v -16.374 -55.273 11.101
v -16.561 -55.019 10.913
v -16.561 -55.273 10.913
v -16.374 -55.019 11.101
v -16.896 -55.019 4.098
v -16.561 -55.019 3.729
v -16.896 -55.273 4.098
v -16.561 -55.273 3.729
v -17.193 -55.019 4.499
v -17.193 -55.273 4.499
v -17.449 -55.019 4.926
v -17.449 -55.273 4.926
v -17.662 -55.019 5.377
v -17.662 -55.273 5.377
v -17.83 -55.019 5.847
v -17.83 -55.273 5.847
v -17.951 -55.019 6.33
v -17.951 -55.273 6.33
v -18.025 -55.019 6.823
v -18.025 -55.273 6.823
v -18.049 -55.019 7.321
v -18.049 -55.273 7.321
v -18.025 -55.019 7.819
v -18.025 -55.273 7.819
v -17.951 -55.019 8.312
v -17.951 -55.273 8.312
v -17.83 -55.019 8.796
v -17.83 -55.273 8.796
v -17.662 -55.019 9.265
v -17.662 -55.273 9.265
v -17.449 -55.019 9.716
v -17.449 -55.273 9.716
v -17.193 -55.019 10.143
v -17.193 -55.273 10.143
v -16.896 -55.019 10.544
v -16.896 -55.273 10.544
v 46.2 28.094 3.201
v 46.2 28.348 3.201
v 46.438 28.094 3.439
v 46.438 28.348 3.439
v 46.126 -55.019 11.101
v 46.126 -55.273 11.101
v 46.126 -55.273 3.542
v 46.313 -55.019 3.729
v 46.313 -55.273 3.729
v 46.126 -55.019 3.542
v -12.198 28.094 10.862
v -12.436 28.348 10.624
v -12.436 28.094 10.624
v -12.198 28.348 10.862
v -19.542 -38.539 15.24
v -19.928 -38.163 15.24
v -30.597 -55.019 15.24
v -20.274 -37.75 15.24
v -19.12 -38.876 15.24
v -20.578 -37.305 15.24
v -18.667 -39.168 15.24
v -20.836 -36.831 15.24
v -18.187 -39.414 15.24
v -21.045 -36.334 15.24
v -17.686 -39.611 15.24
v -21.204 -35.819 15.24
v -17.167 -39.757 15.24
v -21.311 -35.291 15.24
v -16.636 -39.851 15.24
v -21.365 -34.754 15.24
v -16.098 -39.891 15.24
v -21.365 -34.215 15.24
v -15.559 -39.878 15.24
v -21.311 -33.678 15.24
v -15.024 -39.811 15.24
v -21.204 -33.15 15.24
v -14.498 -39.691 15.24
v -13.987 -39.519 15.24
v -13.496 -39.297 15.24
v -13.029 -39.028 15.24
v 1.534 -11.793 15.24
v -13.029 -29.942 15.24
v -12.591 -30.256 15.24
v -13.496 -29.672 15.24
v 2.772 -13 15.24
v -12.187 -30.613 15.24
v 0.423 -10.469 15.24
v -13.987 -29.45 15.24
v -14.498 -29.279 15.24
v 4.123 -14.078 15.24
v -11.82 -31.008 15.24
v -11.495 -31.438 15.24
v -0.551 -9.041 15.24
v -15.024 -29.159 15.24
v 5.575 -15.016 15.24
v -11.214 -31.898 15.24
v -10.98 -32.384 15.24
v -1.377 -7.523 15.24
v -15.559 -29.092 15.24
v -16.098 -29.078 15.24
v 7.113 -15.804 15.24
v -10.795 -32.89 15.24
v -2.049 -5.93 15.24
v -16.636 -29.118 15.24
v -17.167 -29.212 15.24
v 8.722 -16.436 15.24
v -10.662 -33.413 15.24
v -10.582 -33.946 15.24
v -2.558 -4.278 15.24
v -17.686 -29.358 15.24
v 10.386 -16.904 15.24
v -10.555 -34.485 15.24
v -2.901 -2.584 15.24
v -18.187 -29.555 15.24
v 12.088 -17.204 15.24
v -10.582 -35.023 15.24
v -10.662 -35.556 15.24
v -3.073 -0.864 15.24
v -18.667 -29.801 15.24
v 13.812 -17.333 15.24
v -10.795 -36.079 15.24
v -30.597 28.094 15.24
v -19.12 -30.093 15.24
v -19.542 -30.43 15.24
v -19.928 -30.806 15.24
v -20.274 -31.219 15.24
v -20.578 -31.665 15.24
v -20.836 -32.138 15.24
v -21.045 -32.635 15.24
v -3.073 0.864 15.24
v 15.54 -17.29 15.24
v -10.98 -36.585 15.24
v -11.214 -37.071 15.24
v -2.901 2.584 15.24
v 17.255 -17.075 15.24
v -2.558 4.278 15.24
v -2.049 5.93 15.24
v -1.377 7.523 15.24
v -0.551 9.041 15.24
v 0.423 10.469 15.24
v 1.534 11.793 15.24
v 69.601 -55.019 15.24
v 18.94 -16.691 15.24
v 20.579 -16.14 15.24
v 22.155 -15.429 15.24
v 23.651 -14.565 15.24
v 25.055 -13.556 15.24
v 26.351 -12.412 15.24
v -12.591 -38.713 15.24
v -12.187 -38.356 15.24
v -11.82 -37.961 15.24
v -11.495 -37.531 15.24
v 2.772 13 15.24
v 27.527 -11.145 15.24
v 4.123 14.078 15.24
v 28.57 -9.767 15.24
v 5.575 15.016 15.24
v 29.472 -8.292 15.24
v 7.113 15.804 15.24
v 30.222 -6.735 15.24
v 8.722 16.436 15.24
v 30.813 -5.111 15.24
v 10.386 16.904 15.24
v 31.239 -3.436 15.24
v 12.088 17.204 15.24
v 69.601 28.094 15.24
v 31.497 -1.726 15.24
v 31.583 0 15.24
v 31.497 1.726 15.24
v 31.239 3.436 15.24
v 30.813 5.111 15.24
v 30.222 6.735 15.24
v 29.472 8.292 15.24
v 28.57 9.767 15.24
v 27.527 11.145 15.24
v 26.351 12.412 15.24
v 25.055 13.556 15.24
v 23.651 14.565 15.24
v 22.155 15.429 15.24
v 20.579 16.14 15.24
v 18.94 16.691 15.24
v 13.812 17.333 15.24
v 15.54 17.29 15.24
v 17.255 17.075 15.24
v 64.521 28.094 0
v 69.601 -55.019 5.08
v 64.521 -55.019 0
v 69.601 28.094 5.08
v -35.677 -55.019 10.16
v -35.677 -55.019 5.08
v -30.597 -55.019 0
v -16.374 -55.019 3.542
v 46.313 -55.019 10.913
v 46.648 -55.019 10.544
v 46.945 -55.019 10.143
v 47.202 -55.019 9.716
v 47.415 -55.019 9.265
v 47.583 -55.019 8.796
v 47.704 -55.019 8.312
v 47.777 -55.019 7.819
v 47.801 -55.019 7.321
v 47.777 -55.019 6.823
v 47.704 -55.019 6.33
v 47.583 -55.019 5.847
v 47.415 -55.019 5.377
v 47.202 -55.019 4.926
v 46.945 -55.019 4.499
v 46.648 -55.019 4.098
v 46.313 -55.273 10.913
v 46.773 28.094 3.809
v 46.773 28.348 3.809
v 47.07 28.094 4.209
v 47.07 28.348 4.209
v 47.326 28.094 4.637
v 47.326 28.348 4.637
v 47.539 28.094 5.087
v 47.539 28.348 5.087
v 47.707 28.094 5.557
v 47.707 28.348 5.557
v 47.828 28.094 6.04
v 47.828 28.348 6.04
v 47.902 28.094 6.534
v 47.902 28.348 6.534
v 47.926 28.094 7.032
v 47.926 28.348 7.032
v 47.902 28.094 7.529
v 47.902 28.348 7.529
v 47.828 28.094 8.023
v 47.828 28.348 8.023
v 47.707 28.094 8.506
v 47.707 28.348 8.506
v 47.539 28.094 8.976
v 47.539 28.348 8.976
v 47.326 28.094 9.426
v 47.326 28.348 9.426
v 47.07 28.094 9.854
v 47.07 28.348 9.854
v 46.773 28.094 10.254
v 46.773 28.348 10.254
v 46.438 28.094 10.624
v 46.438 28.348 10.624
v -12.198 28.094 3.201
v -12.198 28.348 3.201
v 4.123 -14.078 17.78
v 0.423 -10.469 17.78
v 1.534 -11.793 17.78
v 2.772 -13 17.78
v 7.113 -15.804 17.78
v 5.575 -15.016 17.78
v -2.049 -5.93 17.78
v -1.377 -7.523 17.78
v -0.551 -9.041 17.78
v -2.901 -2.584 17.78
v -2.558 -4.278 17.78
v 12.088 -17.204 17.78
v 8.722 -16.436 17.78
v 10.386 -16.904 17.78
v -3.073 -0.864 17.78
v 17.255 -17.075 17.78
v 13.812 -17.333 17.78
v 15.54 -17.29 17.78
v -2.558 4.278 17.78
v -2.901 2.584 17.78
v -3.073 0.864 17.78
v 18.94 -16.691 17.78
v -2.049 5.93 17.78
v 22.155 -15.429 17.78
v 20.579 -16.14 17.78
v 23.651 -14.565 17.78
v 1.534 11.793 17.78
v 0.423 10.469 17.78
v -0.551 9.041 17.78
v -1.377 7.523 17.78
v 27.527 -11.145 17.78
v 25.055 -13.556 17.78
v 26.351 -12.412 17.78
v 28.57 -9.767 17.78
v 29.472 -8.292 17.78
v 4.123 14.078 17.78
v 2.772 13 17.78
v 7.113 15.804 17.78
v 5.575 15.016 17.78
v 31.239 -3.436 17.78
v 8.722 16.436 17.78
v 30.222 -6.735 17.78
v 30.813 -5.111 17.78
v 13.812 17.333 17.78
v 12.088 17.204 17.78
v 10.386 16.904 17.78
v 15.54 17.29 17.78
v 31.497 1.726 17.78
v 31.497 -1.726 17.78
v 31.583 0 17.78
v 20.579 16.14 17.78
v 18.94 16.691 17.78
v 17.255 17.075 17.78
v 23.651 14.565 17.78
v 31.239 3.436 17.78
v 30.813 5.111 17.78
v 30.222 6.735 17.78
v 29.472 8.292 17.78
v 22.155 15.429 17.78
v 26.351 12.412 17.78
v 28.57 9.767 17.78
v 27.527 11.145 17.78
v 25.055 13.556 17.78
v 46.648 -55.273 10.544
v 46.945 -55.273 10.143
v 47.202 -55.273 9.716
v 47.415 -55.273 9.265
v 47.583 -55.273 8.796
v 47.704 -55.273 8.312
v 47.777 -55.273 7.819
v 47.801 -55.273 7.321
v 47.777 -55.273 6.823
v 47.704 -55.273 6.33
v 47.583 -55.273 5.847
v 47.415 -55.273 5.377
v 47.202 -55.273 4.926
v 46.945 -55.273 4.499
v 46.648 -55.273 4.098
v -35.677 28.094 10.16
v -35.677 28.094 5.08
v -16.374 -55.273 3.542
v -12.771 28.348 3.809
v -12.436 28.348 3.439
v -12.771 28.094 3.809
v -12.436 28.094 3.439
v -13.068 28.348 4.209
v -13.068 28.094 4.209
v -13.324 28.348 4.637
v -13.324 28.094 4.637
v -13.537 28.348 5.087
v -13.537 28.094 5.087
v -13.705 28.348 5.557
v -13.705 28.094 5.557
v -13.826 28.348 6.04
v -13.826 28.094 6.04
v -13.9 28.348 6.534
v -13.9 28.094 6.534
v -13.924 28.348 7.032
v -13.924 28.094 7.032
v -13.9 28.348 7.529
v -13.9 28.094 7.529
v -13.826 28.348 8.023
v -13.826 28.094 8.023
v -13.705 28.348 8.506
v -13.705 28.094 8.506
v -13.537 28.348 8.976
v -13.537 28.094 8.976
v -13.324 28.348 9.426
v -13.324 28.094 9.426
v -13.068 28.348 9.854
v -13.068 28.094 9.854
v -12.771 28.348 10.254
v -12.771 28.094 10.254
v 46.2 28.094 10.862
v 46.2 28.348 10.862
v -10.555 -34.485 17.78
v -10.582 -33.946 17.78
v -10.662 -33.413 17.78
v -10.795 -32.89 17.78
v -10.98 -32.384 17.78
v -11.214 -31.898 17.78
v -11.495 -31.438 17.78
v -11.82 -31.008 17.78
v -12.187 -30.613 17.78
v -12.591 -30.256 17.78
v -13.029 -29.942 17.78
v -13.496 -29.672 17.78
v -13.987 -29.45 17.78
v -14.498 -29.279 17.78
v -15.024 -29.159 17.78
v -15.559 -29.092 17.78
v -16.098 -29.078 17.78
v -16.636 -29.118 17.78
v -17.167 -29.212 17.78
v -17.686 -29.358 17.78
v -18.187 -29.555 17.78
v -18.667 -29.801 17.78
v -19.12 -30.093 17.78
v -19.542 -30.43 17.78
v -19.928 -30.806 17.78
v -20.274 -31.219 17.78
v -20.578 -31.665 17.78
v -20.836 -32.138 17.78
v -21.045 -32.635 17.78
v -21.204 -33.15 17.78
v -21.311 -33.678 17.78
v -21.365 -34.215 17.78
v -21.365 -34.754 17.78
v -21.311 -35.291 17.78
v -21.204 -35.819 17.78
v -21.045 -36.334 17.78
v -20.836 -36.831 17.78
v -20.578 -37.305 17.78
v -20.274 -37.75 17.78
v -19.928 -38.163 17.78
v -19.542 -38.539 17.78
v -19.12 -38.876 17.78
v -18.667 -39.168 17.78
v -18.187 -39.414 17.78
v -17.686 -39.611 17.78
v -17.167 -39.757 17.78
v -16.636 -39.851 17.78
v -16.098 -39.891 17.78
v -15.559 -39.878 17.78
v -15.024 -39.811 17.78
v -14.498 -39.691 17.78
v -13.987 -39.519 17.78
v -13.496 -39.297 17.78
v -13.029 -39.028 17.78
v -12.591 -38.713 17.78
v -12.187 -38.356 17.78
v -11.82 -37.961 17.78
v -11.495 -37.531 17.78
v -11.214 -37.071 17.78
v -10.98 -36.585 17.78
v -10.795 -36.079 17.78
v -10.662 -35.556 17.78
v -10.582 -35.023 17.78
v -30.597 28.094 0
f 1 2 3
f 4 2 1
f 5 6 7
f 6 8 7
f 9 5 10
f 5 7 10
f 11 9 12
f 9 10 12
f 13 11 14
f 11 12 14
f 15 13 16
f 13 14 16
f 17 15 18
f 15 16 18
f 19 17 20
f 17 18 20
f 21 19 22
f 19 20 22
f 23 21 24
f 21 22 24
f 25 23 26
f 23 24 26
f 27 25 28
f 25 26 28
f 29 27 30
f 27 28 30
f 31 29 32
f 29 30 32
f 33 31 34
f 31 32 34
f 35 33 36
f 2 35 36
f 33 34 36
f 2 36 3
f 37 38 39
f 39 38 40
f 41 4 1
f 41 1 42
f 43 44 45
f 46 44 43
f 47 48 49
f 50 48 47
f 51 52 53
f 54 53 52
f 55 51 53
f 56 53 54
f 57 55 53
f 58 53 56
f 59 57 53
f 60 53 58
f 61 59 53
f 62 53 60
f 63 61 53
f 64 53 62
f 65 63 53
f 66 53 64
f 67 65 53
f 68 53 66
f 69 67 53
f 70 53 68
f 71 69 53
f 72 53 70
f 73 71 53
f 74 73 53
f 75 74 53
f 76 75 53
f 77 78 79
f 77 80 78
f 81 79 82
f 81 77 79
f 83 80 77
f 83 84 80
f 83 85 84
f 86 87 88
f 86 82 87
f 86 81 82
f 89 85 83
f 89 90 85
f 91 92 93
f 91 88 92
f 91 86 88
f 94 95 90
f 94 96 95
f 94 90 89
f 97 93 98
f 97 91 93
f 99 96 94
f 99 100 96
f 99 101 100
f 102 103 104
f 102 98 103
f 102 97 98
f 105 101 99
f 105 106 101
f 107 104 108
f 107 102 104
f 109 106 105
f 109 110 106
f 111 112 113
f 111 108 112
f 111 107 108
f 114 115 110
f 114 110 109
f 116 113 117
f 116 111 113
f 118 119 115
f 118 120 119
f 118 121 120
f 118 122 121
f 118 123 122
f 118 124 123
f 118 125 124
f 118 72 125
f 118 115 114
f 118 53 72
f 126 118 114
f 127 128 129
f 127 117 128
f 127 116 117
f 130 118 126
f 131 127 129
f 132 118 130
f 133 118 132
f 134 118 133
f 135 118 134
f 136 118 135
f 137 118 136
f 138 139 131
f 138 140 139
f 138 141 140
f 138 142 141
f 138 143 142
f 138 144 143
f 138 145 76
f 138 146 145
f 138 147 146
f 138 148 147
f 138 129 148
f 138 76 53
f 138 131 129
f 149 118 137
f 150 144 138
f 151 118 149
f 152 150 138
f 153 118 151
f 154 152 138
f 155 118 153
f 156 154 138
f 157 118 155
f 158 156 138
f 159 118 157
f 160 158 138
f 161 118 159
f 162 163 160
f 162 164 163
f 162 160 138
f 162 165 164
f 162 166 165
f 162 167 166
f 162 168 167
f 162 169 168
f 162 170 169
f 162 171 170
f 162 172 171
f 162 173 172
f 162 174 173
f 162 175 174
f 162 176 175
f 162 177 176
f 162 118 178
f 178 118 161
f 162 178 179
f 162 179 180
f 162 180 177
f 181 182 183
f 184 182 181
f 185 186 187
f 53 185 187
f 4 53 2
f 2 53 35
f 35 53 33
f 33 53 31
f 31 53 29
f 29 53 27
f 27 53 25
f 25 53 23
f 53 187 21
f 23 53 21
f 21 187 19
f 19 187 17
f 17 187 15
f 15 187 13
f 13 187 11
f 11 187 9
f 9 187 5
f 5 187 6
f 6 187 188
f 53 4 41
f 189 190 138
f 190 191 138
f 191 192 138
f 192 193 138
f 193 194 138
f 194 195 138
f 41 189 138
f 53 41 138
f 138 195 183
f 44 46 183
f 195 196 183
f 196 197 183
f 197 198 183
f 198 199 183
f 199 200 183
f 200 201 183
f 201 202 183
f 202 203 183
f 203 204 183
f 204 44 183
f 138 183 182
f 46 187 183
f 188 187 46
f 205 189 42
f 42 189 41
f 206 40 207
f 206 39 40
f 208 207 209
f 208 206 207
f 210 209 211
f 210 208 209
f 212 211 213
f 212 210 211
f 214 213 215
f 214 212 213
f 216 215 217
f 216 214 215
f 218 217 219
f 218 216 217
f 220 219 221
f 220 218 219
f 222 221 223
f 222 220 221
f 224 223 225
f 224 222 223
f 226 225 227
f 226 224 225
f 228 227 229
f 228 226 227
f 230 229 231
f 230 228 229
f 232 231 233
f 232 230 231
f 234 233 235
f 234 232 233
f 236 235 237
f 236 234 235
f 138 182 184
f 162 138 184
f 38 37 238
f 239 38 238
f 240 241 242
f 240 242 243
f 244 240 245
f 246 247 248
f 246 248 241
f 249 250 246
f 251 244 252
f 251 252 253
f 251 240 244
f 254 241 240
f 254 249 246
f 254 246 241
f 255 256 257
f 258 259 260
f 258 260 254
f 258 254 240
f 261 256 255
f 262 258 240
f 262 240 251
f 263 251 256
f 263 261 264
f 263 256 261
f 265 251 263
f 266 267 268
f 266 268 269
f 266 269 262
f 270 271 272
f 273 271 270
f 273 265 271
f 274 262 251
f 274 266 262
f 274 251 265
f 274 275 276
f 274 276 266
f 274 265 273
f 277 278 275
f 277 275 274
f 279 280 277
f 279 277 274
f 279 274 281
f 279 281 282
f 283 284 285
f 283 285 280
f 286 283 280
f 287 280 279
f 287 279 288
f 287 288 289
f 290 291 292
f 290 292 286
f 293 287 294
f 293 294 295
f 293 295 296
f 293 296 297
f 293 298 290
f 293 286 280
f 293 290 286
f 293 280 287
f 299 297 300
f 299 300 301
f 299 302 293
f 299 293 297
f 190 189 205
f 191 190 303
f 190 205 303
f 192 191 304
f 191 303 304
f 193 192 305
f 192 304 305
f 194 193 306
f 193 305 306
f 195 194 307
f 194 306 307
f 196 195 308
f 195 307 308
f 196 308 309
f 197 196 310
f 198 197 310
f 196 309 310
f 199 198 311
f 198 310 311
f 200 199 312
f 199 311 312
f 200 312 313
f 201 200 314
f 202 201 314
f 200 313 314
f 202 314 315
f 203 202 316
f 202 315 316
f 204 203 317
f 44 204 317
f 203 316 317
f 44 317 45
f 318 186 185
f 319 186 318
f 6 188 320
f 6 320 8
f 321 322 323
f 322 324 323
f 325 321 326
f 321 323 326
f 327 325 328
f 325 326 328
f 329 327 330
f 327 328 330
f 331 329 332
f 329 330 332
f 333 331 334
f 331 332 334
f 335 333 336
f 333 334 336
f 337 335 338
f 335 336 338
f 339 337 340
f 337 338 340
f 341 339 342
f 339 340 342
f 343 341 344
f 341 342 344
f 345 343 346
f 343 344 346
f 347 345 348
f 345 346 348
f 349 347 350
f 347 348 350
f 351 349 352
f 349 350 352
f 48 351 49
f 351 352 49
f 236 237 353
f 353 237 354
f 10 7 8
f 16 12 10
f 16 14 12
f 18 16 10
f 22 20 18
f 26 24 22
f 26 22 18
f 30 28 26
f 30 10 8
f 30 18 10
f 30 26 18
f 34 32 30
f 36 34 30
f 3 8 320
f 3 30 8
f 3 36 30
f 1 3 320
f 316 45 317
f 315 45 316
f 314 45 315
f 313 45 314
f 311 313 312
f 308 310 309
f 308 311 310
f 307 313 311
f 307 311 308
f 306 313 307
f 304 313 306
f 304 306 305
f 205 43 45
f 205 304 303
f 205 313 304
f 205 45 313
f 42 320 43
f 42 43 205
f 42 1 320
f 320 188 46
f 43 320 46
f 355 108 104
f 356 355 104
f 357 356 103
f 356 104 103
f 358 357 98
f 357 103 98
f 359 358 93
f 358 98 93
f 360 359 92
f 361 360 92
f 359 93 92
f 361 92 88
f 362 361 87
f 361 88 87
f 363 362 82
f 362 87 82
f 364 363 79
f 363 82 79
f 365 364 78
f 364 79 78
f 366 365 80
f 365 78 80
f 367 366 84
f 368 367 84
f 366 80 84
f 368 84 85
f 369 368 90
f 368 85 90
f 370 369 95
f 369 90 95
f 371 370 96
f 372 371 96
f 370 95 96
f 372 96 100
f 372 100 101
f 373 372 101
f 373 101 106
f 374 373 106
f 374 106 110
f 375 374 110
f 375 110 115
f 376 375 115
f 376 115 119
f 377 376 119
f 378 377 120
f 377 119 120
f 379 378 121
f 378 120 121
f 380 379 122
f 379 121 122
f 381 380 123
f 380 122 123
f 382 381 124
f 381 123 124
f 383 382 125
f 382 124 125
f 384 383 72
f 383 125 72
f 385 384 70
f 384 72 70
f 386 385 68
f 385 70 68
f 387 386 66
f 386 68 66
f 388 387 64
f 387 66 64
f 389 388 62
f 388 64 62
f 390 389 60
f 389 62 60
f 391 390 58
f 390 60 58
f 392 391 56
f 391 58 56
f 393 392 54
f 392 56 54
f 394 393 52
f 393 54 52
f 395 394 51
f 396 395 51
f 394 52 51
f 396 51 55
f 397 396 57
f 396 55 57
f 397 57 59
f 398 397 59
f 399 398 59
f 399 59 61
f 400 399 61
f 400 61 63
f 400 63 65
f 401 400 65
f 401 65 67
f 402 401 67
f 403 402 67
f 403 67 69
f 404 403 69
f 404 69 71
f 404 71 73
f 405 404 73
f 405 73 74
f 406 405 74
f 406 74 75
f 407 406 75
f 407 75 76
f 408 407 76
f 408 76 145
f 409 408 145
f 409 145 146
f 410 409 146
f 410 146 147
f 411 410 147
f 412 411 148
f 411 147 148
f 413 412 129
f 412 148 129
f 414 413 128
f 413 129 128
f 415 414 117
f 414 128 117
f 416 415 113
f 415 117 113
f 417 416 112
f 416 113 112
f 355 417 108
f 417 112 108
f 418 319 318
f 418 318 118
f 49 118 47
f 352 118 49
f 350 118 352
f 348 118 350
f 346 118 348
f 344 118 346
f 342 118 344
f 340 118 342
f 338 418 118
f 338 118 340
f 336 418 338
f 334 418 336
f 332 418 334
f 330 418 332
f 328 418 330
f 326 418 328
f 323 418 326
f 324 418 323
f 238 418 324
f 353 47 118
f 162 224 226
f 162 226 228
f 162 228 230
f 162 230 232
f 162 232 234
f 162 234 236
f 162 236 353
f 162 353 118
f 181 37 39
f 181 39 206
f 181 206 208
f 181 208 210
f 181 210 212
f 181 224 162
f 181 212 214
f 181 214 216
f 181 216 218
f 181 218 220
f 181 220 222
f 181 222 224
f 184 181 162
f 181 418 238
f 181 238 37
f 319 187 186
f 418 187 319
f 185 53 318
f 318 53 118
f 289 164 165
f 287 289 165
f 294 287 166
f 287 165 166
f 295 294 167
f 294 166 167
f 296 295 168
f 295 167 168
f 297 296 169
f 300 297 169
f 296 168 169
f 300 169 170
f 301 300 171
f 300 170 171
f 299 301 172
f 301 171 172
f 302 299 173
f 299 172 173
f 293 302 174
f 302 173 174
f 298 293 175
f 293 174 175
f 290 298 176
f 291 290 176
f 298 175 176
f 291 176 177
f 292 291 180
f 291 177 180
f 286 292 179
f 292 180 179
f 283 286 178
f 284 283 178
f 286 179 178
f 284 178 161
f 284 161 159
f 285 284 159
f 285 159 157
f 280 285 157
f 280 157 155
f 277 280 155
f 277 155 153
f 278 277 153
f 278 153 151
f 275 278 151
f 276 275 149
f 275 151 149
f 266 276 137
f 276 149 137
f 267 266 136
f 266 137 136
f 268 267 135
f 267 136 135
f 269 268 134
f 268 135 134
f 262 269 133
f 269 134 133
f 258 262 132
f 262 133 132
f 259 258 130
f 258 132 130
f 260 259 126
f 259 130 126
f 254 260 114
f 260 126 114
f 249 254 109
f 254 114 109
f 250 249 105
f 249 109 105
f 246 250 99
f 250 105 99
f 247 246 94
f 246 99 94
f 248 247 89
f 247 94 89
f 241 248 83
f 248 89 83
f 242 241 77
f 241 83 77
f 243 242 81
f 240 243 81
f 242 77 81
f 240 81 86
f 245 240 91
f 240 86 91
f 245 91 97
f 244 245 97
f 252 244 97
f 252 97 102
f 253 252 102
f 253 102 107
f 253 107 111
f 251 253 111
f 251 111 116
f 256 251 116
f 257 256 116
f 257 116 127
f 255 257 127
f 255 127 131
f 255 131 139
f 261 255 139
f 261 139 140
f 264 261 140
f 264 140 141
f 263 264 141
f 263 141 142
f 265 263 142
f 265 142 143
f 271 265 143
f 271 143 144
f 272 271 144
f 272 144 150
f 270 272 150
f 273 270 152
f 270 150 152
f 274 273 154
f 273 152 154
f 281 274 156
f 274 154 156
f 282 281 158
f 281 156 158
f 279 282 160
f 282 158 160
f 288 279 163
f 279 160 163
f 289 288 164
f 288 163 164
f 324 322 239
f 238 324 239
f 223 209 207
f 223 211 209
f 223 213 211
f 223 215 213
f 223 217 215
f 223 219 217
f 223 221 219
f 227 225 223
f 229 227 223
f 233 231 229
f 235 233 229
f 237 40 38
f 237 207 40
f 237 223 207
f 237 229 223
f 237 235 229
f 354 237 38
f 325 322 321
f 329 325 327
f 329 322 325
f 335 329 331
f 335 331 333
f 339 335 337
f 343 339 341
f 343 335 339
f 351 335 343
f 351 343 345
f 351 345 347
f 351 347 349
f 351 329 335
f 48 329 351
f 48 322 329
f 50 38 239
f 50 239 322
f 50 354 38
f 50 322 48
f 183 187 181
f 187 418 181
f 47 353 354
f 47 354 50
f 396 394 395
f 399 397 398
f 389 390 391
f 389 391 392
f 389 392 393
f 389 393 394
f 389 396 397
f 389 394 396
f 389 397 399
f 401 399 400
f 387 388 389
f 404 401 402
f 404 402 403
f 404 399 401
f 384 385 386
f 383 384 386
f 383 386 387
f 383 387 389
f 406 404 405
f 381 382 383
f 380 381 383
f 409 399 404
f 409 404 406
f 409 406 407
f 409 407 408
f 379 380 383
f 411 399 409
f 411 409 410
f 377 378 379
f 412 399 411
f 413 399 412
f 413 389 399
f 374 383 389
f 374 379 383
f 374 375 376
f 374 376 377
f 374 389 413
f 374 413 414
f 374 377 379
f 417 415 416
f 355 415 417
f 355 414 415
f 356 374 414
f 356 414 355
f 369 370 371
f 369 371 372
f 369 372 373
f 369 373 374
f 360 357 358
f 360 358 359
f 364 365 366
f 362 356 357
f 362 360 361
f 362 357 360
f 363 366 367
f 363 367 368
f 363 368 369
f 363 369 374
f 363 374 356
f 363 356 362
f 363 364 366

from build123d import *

# Parameters (mm, degrees)
F0_W         = 105.2784845233
F0_H         = 83.1132326275
F1_DEPTH     = 15.24
F2_SIZE      = 5.08
F3_SIZE      = 5.08
F4_R         = 17.3387510066
F4_R_2       = 5.4081350991
F5_DEPTH     = 2.54
F6_W         = 68.5574207455
F6_H         = 7.6610487886
F7_DEPTH     = 0.254
F8_W         = 72.6598203182
F8_H         = 7.5589888729
F9_DEPTH     = 0.254
F10_T1_DEPTH = 13.3181495789
F11_R        = 5.08
F12_T1_DEPTH = 13.3181495789
F13_R        = 5.08


# Not quite as in the source:
# - a fillet or chamfer that OpenCascade refuses, or shapes differently, is made with other operations: its cross-section is extruded or revolved along the edge and cut away or added


with BuildPart() as f1:
    # F0 (on Top) → F1 (new body)
    with BuildSketch(Plane.XY):
        with Locations((16.9621892273, -13.4625034407)):
            Rectangle(F0_W, F0_H)
    extrude(amount=F1_DEPTH)

    # F2
    f2_edges = [f1.edges().sort_by_distance(p)[0] for p in [
        (-35.677053, -13.462503, 15.24),
        (-35.677053, -13.462503, 0),
    ]]
    chamfer(f2_edges, length=F2_SIZE)

    # F3
    f3_edges = [f1.edges().sort_by_distance(p)[0] for p in [
        (69.601431, -13.462503, 0),
    ]]
    chamfer(f3_edges, length=F3_SIZE)

    # F4 (on face) → F5 (join)
    with BuildSketch(Plane.XY.offset(15.24)):
        with Locations((14.2443789936, 0)):
            Circle(F4_R)
        with Locations((-15.9631352872, -34.4845345244)):
            Circle(F4_R_2)
    extrude(amount=F5_DEPTH)

    # F6 (on face) → F7 (join)
    with BuildSketch(Plane(origin=(0, 28.0941128731, 0), x_dir=(-1, 0, 0), z_dir=(0, 1, 0))):
        with Locations((-17.0010654256, 7.0315066259)):
            Rectangle(F6_W, F6_H)
    extrude(amount=F7_DEPTH)

    # F8 (on face) → F9 (join)
    with BuildSketch(Plane.XZ.offset(55.0191197544)):
        with Locations((14.8761942983, 7.3211907875)):
            Rectangle(F8_W, F8_H)
    extrude(amount=F9_DEPTH)

    # F10: chamfer of 5.08 on 4 edges, made by hand

    # F10_s2 → F10_t1 (cut)
    with BuildSketch(Plane.XZ.offset(55.0191197544)):
        Polygon((51.2061044574, 8.621696351), (46.1261044574, 3.541696351), (51.2061044574, 3.541696351), align=None)
        Polygon((51.2061044574, 6.0206852239), (46.1261044574, 11.1006852239), (51.2061044574, 11.1006852239), align=None)
        Polygon((-21.4537158608, 6.0206852239), (-16.3737158608, 11.1006852239), (-21.4537158608, 11.1006852239), align=None)
        Polygon((-16.3737158608, 3.541696351), (-21.4537158608, 8.621696351), (-21.4537158608, 3.541696351), align=None)
    extrude(amount=F10_T1_DEPTH, mode=Mode.SUBTRACT)

    # F11
    f11_edges = [f1.edges().sort_by_distance(p)[0] for p in [
        (-20.15321, -55.14612, 7.321191),
        (49.905599, -55.14612, 7.321191),
    ]]
    fillet(f11_edges, radius=F11_R)

    # F12: chamfer of 5.08 on 4 edges, made by hand

    # F12_s2 → F12_t1 (cut)
    with BuildSketch(Plane.XZ.offset(-41.4122624519)):
        Polygon((51.2797757983, 5.7820310202), (46.1997757983, 10.8620310202), (51.2797757983, 10.8620310202), align=None)
        Polygon((46.1997757983, 3.2009822316), (51.2797757983, 8.2809822316), (51.2797757983, 3.2009822316), align=None)
        Polygon((-17.2776449472, 8.2809822316), (-12.1976449472, 3.2009822316), (-17.2776449472, 3.2009822316), align=None)
        Polygon((-17.2776449472, 5.7820310202), (-12.1976449472, 10.8620310202), (-17.2776449472, 10.8620310202), align=None)
    extrude(amount=F12_T1_DEPTH, mode=Mode.SUBTRACT)

    # F13
    f13_edges = [f1.edges().sort_by_distance(p)[0] for p in [
        (-16.028169, 28.221113, 7.031507),
        (50.0303, 28.221113, 7.031507),
    ]]
    fillet(f13_edges, radius=F13_R)


solid = f1.part
